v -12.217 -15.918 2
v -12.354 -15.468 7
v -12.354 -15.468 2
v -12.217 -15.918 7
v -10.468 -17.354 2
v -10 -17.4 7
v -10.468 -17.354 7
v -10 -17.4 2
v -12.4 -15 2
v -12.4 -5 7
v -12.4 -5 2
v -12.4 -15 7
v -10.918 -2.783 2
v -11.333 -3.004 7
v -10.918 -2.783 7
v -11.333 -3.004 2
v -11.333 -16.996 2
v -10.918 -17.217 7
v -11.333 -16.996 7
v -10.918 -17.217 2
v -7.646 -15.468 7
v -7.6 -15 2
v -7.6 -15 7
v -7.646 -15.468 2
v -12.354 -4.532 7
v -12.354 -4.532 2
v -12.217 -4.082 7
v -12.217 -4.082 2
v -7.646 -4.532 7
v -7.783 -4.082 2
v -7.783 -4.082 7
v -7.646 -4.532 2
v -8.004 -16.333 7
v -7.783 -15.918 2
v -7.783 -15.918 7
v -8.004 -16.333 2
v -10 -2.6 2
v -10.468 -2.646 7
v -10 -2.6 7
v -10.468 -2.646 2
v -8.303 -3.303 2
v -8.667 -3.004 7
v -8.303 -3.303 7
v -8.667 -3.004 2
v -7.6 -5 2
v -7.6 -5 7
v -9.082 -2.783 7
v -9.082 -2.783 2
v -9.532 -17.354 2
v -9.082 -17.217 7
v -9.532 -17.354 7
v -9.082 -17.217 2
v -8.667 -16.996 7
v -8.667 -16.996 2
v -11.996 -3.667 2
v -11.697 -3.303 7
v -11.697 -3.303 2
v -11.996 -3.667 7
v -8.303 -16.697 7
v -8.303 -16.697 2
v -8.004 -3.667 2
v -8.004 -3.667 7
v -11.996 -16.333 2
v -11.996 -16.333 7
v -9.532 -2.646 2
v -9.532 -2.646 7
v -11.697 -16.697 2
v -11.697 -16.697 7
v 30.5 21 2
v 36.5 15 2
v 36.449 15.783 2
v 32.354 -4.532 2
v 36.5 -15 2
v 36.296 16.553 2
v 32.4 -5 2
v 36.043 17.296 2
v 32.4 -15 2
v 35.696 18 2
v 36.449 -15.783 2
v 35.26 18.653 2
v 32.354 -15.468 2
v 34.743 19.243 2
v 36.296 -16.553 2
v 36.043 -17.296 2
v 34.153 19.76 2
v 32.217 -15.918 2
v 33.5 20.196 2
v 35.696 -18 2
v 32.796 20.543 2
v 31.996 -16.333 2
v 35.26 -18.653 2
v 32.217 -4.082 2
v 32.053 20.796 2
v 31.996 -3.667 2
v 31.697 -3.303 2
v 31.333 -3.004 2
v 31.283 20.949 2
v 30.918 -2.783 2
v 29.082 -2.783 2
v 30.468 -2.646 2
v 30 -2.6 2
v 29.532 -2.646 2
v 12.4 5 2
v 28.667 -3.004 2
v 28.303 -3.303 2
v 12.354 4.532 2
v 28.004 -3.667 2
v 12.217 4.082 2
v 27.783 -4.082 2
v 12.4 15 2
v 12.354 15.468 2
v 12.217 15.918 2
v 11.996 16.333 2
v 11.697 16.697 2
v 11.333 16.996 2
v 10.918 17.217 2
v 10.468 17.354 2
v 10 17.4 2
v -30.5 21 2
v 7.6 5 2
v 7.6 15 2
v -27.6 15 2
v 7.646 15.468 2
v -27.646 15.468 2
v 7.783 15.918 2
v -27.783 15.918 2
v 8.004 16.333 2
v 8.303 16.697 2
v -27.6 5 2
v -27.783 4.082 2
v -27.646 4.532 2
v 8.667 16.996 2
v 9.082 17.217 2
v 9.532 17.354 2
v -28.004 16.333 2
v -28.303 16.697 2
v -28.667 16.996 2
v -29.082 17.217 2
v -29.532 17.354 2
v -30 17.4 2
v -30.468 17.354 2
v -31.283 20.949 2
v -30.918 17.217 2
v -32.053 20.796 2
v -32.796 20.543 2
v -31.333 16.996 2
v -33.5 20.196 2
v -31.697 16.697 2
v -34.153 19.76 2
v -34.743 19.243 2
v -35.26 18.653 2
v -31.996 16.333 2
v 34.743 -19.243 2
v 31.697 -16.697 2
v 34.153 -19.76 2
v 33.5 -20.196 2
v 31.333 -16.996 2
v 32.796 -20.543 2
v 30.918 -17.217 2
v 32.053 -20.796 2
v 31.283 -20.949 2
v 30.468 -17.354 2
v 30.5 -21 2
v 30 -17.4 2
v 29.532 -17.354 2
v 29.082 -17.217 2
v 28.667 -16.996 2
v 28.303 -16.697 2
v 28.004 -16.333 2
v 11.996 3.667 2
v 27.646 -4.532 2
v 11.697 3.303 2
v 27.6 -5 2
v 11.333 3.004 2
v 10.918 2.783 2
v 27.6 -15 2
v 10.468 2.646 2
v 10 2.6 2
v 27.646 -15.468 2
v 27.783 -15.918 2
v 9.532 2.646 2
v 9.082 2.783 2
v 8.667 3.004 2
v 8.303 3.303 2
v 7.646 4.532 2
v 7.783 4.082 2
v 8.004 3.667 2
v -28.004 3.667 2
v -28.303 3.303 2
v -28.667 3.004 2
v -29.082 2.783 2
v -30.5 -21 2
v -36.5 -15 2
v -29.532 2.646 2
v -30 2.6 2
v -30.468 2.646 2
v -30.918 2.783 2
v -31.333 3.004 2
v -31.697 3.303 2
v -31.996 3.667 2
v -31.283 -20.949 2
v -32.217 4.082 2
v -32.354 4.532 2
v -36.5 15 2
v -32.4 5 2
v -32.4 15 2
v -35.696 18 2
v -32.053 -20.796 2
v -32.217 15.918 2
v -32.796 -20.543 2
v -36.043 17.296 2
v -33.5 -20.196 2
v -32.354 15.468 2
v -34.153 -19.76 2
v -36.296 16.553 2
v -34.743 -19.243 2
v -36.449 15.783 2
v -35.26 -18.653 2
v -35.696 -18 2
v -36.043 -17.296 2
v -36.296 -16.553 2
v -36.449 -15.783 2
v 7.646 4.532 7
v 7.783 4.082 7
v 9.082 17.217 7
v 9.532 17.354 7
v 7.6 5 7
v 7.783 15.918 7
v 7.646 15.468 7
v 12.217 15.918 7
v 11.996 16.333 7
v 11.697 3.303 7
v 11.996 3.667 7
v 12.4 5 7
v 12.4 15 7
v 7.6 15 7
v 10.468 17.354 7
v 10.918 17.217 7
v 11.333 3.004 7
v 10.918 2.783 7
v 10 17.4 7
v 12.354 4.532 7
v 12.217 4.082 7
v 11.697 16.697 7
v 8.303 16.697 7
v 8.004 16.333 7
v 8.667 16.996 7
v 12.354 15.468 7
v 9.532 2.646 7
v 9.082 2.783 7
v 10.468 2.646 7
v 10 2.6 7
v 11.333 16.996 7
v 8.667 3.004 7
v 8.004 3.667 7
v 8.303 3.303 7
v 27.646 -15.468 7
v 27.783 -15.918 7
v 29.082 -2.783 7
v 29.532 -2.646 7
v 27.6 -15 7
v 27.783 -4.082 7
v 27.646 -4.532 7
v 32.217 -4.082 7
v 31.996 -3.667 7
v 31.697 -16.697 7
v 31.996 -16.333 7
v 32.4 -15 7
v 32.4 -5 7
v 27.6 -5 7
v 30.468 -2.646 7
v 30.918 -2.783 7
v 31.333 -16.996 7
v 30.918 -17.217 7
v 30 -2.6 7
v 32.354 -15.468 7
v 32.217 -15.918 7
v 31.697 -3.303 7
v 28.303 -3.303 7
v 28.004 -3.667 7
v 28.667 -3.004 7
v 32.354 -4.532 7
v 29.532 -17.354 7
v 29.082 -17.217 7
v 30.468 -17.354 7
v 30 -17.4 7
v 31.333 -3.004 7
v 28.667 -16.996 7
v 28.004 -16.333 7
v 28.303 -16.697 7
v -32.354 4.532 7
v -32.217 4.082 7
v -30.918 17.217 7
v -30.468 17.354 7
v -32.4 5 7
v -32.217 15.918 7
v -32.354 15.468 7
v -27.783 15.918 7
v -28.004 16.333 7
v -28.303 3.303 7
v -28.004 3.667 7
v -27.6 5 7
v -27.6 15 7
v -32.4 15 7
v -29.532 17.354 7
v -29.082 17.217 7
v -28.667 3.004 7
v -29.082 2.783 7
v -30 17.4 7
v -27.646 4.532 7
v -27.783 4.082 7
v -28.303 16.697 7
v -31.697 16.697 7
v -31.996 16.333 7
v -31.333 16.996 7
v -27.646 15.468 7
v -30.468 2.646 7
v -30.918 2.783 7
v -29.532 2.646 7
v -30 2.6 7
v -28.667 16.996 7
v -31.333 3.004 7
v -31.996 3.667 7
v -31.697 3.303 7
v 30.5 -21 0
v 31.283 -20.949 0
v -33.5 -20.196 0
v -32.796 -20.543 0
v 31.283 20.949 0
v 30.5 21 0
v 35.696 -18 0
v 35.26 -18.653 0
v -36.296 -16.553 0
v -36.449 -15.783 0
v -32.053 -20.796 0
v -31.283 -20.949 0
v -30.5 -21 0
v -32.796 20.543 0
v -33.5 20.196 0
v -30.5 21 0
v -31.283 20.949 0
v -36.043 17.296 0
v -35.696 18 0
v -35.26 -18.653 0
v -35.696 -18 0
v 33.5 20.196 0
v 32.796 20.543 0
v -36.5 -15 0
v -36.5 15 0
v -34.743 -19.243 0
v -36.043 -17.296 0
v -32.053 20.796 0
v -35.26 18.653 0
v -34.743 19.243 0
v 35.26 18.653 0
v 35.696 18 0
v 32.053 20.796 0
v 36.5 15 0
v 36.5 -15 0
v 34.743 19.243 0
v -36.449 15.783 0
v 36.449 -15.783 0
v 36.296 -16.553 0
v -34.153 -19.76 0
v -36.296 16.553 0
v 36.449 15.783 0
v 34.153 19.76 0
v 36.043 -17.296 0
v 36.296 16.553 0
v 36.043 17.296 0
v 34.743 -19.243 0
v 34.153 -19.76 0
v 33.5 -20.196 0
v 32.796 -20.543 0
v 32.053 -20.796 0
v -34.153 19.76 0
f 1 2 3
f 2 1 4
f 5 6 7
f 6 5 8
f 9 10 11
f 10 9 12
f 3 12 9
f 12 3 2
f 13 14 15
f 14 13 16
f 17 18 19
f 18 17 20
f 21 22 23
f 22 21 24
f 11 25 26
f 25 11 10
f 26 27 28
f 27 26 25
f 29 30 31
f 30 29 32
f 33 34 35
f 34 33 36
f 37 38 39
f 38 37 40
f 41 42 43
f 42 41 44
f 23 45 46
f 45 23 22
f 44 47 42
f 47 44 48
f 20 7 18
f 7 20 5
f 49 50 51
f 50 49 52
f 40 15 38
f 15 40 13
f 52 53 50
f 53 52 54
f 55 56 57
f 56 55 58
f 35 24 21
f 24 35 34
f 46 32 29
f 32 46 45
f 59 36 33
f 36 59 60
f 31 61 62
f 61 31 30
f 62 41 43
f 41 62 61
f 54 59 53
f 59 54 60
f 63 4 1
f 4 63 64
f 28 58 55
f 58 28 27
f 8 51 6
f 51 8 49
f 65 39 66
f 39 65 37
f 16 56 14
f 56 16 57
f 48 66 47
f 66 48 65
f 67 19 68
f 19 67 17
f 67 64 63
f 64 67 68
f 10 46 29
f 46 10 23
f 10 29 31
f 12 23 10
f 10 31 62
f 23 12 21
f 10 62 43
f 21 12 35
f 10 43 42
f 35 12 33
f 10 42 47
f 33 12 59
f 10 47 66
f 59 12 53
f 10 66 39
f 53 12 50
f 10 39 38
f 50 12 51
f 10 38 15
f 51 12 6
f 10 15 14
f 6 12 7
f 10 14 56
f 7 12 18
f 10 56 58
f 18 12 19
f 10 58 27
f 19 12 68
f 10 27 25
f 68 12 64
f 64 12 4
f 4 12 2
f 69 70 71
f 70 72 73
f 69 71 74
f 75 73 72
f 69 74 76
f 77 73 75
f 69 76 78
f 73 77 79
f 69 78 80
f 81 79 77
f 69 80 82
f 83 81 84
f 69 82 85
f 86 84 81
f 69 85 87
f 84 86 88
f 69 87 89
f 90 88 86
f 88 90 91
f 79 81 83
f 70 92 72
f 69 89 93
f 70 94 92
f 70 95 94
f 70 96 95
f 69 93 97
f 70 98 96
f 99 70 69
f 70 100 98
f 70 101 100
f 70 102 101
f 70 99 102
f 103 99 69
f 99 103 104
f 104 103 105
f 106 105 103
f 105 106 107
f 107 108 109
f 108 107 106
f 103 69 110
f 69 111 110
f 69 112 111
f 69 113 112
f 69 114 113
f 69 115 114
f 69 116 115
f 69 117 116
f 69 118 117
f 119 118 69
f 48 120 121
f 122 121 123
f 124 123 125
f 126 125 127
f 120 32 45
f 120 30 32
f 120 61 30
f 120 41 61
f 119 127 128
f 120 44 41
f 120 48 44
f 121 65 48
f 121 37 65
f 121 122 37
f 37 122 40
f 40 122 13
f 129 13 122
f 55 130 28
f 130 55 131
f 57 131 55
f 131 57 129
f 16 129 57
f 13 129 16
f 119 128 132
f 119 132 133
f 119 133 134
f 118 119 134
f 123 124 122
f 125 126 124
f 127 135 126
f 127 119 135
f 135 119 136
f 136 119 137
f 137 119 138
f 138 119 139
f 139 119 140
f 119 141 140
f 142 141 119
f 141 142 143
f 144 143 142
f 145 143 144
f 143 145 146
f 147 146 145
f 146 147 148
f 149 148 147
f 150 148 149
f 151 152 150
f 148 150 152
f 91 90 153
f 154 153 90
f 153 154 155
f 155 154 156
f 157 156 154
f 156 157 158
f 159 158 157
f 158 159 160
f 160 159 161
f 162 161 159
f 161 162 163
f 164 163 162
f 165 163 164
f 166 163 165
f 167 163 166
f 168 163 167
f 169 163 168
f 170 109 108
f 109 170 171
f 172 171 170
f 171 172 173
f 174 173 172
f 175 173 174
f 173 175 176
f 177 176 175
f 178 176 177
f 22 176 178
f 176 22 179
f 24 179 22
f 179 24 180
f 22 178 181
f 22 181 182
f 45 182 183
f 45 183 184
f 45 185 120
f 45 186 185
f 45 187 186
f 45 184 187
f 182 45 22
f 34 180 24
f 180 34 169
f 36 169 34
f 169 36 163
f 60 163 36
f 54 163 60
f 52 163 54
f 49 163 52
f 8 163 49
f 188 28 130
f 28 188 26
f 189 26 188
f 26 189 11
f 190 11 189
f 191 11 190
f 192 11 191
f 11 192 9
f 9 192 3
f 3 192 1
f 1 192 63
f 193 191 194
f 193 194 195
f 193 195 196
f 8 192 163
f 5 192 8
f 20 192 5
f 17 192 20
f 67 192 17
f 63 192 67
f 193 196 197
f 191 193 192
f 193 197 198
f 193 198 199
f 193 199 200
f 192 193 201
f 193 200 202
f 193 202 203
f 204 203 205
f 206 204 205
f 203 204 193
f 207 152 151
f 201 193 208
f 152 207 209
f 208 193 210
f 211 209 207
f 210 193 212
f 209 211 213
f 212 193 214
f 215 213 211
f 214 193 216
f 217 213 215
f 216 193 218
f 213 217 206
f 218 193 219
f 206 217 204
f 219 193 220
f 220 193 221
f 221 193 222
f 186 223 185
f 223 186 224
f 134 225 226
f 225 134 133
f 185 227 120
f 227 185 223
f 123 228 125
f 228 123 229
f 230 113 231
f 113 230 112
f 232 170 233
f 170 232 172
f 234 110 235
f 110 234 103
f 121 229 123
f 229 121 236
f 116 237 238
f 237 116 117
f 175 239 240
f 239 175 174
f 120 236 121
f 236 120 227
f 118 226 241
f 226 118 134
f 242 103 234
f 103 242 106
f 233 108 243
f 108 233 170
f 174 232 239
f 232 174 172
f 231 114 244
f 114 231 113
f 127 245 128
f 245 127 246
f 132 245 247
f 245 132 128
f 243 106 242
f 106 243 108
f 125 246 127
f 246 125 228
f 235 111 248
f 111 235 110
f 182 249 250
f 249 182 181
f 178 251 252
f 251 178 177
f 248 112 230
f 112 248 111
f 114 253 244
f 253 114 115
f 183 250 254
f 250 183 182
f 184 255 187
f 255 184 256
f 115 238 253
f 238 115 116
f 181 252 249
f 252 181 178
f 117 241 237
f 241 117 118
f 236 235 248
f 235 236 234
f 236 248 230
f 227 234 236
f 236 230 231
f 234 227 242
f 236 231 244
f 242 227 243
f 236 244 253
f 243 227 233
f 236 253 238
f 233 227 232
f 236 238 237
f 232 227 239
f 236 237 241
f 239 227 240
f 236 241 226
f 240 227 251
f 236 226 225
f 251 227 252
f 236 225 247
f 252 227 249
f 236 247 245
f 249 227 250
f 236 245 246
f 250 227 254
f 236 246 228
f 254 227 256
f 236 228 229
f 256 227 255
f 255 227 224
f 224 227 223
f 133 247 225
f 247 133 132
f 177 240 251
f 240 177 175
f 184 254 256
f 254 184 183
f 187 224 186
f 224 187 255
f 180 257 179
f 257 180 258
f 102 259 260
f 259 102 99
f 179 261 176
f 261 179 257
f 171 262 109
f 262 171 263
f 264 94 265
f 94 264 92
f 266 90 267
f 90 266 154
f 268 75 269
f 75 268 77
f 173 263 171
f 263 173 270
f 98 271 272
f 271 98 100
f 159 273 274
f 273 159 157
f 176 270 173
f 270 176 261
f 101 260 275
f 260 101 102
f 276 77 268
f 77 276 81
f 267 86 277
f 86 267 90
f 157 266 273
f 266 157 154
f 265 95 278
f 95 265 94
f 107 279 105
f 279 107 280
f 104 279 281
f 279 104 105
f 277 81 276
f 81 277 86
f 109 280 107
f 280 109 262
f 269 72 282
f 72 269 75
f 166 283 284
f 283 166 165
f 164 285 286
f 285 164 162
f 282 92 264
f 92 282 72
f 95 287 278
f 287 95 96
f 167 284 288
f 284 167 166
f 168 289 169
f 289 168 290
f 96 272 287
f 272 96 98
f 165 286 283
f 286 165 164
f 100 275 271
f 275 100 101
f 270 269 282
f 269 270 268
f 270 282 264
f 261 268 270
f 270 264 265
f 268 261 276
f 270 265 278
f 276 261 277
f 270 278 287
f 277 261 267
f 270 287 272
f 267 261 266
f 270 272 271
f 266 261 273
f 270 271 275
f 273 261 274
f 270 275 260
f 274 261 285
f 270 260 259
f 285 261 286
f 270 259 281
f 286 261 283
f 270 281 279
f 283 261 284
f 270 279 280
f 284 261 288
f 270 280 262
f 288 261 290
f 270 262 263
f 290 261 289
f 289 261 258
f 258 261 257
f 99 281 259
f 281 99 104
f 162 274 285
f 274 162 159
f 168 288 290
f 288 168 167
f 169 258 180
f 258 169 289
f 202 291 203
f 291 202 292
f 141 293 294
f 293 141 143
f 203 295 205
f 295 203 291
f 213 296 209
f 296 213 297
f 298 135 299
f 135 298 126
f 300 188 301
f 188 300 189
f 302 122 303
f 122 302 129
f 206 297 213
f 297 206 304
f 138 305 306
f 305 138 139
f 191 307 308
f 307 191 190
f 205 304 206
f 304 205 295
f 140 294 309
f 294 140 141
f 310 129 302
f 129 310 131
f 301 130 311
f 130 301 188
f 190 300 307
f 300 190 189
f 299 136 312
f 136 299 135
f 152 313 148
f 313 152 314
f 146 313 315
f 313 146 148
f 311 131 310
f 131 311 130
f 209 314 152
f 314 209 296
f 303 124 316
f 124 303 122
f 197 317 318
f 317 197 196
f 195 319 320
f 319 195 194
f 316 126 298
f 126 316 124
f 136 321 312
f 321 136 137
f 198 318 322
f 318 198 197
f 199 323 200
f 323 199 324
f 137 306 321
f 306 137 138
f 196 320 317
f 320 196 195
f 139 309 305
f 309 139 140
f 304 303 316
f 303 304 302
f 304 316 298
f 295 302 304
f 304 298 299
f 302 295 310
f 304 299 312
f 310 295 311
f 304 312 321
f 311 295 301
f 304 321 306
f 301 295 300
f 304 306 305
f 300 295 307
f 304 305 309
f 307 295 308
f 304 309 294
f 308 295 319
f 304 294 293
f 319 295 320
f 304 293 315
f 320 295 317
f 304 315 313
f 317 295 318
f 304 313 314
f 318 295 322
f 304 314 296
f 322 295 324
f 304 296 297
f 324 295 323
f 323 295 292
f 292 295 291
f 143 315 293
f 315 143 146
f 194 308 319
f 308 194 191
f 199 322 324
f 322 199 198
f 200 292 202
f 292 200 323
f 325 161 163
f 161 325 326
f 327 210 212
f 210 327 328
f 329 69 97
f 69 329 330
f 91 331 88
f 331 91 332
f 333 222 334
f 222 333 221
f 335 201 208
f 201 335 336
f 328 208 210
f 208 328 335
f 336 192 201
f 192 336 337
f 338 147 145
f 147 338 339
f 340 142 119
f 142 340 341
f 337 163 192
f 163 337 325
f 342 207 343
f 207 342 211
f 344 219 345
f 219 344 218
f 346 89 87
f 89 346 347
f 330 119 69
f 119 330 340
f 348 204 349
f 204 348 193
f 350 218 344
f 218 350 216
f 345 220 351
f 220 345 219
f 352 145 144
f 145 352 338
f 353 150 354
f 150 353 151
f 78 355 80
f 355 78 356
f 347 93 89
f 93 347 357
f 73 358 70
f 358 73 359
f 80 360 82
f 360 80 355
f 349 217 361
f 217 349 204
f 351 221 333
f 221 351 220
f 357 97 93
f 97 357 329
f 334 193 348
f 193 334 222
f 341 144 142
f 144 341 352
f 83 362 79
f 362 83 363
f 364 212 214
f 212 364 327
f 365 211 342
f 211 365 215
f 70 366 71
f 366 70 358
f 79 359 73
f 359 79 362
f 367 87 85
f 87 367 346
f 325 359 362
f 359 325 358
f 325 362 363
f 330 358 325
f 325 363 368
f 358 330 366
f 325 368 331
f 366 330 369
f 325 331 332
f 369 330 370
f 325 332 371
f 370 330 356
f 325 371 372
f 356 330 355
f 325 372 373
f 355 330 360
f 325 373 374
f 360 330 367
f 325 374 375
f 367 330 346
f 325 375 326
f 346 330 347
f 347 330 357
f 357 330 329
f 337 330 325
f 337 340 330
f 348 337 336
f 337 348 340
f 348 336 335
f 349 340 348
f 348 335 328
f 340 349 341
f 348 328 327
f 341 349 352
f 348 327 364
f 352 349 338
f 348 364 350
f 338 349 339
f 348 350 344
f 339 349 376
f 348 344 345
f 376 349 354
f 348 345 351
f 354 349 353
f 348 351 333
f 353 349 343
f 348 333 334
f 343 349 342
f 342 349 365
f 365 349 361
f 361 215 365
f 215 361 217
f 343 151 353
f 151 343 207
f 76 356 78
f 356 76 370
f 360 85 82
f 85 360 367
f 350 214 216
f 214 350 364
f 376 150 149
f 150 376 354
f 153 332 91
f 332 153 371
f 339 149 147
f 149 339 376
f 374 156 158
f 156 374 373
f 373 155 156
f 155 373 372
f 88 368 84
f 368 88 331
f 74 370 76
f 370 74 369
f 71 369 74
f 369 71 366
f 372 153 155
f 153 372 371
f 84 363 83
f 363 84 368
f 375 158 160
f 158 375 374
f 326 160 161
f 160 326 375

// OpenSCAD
// Back brackets for the SKÅDIS tiles (skadis-tile.scad): a thin plate on the back of a
// joint with pegs that fill slots in each tile, glued in. The pegs run the full board
// thickness, so they finish flush with the front, and the plate stiffens the joint so it
// cannot hinge. The keys hold the tiles together; the brackets make the board one panel.
//
//   type = "cross"     where four tiles meet: 73 x 42 plate, four pegs, one in each tile.
//                      Centre it on the corner. It fits either way up (180° symmetric).
//   type = "bridge-h"  across an upright joint: 62 x 21 stadium, two pegs side by side 40 apart
//                      (the shape in Scott's picture).
//   type = "bridge-v"  across a level joint: 21 x 71, two pegs one above the other 40 apart.
//
// Where: a cross on every corner where four tiles meet. A bridge on every joint where it
// reaches the board's outside edge, centred on the 4th slot row (or column) in from that
// edge; a single-row board's joints reach two edges, so two bridges each. Each bracket
// fills only its own slots and leaves at least 1 mm to every other slot.
//
// Peg positions, from the pattern (slots at 10 + 40 i and 30 + 40 i, every tile edge on a
// multiple of 40): cross, relative to the corner: (-10,-10) (+10,+10) (+30,-10) (-30,+10).
// Bridges: two slots 40 apart in the same row (h) or the same column (v).
//
// Print plate down, pegs up, as saved, PETG, 100 % (they are small), no supports.
//   openscad -D 'type="cross"' -o skadis-cross-x1.stl skadis-bracket.scad

type = "cross";            // cross, bridge-h, bridge-v
th = 5;                    // board thickness: the pegs are this tall, so they end flush with the front
proud = 0;                 // + makes the pegs longer, - shorter; -0.1 if a peg stands proud of the front
plate = 2;                 // plate thickness, behind the board
slot_w = 5; slot_h = 15;   // SKÅDIS slot
fit = 0.1;                 // pegs are drawn this much smaller all round than the slot: room for CA glue

peg_w = slot_w - 2 * fit; peg_l = slot_h - 2 * fit;
module peg2d() { hull() for (s = [-1, 1]) translate([0, s * (peg_l - peg_w) / 2]) circle(d = peg_w, $fn = 32); }
module slot2d() { hull() for (s = [-1, 1]) translate([0, s * (slot_h - slot_w) / 2]) circle(d = slot_w, $fn = 32); }
module rrect(w, h, r) { offset(r = r, $fn = 48) square([w - 2 * r, h - 2 * r], center = true); }

pegs = type == "cross"    ? [[-10, -10], [10, 10], [30, -10], [-30, 10]]
     : type == "bridge-h" ? [[-20, 0], [20, 0]]
     :                      [[0, -20], [0, 20]];

module outline() {
    if (type == "cross")         rrect(73, 42, 6);                                              // 1.5 mm clear of the slots above and below
    else if (type == "bridge-h") hull() for (p = pegs) translate(p) circle(r = 10.5, $fn = 64);  // 2 mm clear of the slots above and below
    else                         hull() for (p = pegs) translate(p) offset(r = 8, $fn = 48) slot2d();
}

linear_extrude(plate) outline();
for (p = pegs) translate([p[0], p[1], plate]) linear_extrude(th + proud) peg2d();
